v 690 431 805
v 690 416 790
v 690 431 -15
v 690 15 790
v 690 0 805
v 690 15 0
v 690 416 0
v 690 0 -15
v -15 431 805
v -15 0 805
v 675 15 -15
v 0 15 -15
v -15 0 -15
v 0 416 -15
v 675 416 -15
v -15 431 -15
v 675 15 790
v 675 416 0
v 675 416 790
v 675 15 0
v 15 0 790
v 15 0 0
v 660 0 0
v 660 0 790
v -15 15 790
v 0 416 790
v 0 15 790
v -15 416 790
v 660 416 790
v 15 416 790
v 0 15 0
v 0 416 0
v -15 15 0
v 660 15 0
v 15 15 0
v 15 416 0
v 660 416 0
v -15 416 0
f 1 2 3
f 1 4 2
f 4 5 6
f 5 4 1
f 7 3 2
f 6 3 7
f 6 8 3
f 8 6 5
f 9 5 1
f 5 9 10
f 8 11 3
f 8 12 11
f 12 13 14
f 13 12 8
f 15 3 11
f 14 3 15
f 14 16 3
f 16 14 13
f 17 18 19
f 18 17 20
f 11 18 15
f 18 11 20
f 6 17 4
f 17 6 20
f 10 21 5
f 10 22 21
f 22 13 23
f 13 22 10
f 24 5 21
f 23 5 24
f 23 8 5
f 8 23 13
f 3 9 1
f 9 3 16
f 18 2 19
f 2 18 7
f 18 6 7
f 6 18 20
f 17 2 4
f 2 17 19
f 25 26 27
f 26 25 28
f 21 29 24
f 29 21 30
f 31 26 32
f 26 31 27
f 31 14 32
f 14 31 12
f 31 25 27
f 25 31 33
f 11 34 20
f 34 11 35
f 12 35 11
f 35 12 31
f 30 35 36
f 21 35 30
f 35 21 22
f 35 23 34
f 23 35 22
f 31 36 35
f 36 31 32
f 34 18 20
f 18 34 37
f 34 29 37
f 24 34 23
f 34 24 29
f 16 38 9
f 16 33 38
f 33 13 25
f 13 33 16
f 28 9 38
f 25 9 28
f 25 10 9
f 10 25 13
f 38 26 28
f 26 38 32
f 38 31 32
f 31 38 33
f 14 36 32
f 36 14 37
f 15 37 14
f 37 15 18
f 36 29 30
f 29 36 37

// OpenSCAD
module metalon( perf, l, angle1 = 0, angle2 = 0 ) {
    
    cube( [ perf[ 0 ], perf[ 1 ], l ] );
    
}

BLACK = [ 0.0, 0.0, 0.0 ];
WHITE = [ 1.0, 1.0, 1.0 ];

espessura_tampo_lateral = 15;
profundidade_tampo_lateral = 431;
altura_tampo_lateral = 790;

largura_gaveta = 654;
chapa_trilho = 1;
folga = 2;

espessura_metalon = 15;

distancia_tampo_lateral = largura_gaveta + 2 * chapa_trilho + 2 * folga;

color( WHITE )
    cube( [ espessura_tampo_lateral, profundidade_tampo_lateral, altura_tampo_lateral ] );

translate( [ distancia_tampo_lateral, 0, 0 ] )
    color( WHITE )
        cube( [ espessura_tampo_lateral, profundidade_tampo_lateral, altura_tampo_lateral ] );

translate( [ -espessura_metalon, 0, -espessura_tampo_lateral ] )
    color( BLACK )
        metalon( [ espessura_metalon, espessura_metalon ], altura_tampo_lateral + 2 * espessura_metalon );
translate( [ -espessura_metalon, profundidade_tampo_lateral - espessura_metalon, -espessura_tampo_lateral ] )
    color( BLACK )
        metalon( [ espessura_metalon, espessura_metalon ], altura_tampo_lateral + 2 * espessura_metalon );
        echo( altura_tampo_lateral + 2 * espessura_metalon );
translate( [ -espessura_metalon, 0, 0 ] )
    rotate( -90, [ 1, 0, 0 ] )
        color( BLACK )
            metalon( [ espessura_metalon, espessura_metalon ], profundidade_tampo_lateral );
            echo( profundidade_tampo_lateral );
translate( [ -espessura_metalon, 0, altura_tampo_lateral + espessura_metalon ] )
    rotate( -90, [ 1, 0, 0 ] )
        color( BLACK )
            metalon( [ espessura_metalon, espessura_metalon ], profundidade_tampo_lateral );
            
translate( [ espessura_metalon + distancia_tampo_lateral + espessura_tampo_lateral, 0, 0 ] ){
    translate( [ -espessura_metalon, 0, -espessura_tampo_lateral ] )
        color( BLACK )
            metalon( [ espessura_metalon, espessura_metalon ], altura_tampo_lateral + 2 * espessura_tampo_lateral );
    translate( [ -espessura_metalon, profundidade_tampo_lateral - espessura_metalon, -espessura_tampo_lateral ] )
        color( BLACK )
            metalon( [ espessura_metalon, espessura_metalon ], altura_tampo_lateral + 2 * espessura_tampo_lateral );
    translate( [ -espessura_metalon, 0, 0 ] )
        rotate( -90, [ 1, 0, 0 ] )
            color( BLACK )
                metalon( [ espessura_metalon, espessura_metalon ], profundidade_tampo_lateral );
    translate( [ -espessura_metalon, 0, altura_tampo_lateral + espessura_metalon ] )
        rotate( -90, [ 1, 0, 0 ] )
            color( BLACK )
                metalon( [ espessura_metalon, espessura_metalon ], profundidade_tampo_lateral );
}

rotate( 90, [ 0, 1, 0 ] )
    color( BLACK )
        #metalon( [ espessura_metalon, espessura_metalon ], distancia_tampo_lateral + espessura_tampo_lateral );
echo( distancia_tampo_lateral + espessura_tampo_lateral );
translate( [ 0, profundidade_tampo_lateral - espessura_metalon, 0 ] )
    rotate( 90, [ 0, 1, 0 ] )
        color( BLACK )
            metalon( [ espessura_metalon, espessura_metalon ], distancia_tampo_lateral + espessura_tampo_lateral );

translate( [ 0, 0, altura_tampo_lateral + espessura_metalon ] ) {
    rotate( 90, [ 0, 1, 0 ] )
        color( BLACK )
            metalon( [ espessura_metalon, espessura_metalon ], distancia_tampo_lateral + espessura_tampo_lateral );
    translate( [ 0, profundidade_tampo_lateral - espessura_metalon, 0 ] )
        rotate( 90, [ 0, 1, 0 ] )
            color( BLACK )
                metalon( [ espessura_metalon, espessura_metalon ], distancia_tampo_lateral + espessura_tampo_lateral );
}

translate( [ 0, espessura_metalon, altura_tampo_lateral ] )
    color( WHITE )
        cube( [ distancia_tampo_lateral + espessura_tampo_lateral, profundidade_tampo_lateral - 2 * espessura_metalon, espessura_tampo_lateral ] );

translate( [ espessura_tampo_lateral, profundidade_tampo_lateral - espessura_tampo_lateral, 0 ] )
    color( WHITE )
        cube( [ distancia_tampo_lateral - espessura_tampo_lateral, espessura_tampo_lateral, altura_tampo_lateral ] );
